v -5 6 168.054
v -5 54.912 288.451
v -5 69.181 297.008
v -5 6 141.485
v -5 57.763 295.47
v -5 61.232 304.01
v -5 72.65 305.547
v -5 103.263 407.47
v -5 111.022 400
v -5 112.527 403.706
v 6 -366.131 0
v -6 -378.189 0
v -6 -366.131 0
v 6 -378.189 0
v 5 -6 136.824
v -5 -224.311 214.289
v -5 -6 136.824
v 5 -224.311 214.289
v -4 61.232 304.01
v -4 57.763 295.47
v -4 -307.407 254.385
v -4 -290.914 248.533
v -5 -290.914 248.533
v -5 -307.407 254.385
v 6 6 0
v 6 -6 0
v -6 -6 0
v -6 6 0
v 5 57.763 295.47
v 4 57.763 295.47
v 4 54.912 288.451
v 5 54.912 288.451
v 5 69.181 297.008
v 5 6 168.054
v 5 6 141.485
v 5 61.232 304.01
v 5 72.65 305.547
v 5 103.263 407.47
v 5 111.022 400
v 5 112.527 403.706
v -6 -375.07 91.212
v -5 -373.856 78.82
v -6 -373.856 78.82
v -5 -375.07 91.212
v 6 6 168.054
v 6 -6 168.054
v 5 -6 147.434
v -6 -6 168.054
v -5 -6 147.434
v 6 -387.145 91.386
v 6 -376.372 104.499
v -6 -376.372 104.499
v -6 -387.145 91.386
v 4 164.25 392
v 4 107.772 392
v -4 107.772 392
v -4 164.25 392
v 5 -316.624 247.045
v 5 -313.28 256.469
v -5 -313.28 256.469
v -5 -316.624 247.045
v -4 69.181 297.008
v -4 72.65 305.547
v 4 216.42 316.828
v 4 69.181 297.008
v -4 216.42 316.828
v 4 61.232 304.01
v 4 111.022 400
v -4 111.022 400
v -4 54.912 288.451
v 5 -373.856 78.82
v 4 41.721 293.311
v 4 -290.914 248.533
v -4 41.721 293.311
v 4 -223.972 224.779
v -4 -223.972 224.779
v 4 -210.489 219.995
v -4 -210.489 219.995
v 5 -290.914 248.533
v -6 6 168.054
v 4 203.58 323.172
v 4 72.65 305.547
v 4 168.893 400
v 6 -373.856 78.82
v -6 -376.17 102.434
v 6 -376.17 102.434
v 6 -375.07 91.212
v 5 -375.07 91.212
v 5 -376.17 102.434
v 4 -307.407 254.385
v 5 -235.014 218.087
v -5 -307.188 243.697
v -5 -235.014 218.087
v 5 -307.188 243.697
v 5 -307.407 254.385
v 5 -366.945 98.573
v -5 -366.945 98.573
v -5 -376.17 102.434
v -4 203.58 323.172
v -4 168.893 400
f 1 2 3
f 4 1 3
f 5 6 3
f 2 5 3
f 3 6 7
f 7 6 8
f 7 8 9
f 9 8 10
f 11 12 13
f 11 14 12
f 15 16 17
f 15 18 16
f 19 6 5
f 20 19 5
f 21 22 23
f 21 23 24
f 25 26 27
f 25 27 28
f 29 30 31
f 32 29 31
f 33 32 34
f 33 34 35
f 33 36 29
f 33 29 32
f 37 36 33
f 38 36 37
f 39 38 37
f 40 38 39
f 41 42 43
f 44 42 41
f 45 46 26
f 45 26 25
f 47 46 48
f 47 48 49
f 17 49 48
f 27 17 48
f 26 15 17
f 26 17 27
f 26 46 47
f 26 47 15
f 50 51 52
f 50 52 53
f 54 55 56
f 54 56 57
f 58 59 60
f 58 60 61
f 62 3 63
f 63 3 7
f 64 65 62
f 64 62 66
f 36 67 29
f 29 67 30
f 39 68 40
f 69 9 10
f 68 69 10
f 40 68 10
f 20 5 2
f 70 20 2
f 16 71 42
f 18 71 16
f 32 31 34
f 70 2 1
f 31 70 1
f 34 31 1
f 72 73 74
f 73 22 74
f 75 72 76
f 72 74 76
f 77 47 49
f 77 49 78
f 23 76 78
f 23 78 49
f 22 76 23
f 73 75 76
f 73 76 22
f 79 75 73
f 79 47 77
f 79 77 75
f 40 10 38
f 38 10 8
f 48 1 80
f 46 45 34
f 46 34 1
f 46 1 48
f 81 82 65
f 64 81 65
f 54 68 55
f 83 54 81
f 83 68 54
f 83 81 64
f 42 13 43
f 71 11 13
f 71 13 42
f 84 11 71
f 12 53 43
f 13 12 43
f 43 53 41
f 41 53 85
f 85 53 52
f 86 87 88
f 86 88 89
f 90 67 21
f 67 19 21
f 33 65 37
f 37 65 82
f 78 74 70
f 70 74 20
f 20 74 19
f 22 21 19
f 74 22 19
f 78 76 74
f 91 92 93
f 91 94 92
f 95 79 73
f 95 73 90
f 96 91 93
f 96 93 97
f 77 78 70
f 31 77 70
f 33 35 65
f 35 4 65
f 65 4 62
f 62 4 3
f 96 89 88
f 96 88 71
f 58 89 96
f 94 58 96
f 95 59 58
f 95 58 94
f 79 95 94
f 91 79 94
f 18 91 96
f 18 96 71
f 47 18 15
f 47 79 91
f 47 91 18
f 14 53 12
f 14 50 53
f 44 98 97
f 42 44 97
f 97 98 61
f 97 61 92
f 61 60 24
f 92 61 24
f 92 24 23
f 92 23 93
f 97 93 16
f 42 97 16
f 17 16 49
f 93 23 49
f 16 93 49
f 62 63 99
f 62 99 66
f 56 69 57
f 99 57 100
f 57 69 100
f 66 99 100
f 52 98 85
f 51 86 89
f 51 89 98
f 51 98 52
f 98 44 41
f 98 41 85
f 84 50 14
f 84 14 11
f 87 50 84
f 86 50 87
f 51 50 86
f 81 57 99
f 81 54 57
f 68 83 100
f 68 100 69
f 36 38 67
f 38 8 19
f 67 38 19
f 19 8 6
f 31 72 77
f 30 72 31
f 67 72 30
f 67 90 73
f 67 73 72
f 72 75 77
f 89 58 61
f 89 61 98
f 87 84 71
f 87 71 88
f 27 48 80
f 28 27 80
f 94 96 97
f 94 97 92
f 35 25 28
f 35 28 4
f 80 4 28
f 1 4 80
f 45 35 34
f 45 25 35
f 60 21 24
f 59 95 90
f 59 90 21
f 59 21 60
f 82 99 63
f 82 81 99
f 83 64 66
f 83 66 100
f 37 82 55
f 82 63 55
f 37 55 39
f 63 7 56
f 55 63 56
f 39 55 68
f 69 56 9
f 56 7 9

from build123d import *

# Parameters (mm, degrees)
F2_DEPTH = 6
F3_DEPTH = 5
F4_DEPTH = 4


with BuildPart() as f2:
    # F1 (on Right) → F2 (new body, symmetric)
    with BuildSketch(Plane.YZ):
        Polygon((6, 168.0537815686), (-6, 168.0537815686), (-6, 147.4344787753), (-6, 136.8235857408), (-6, 0), (6, 0), (6, 141.4846799699), align=None)
    extrude(amount=F2_DEPTH, both=True)



with BuildPart() as f2b:
    # F1 (on Right) → F2, piece 2 (new body, symmetric)
    with BuildSketch(Plane.YZ):
        Polygon((-366.1312568474, 0), (-373.8555777285, 78.8196008275), (-375.0700772329, 91.2124529134), (-376.1697828669, 102.433938974), (-376.3721973614, 104.499393), (-387.1445919312, 91.3862120271), (-378.1887431526, 0), align=None)
    extrude(amount=F2_DEPTH, both=True)


with BuildPart() as f2_1:
    add(f2.part)

    add(f2b.part)  # F3 merges F2b
    # F1 (on Right) → F3 (join, symmetric)
    with BuildSketch(Plane.YZ):
        Polygon((54.9115302543, 288.4513945022), (6, 168.0537815686), (6, 141.4846799699), (69.1811610546, 297.0075379505), (72.6501883928, 305.5466821674), (107.7718487622, 392), (111.0218487622, 400), (112.5273569501, 403.7058663085), (103.2626911788, 407.469636778), (61.2320620859, 304.0096267031), (57.7630347477, 295.4704824861), align=None)
        Polygon((-6, 136.8235857408), (-6, 147.4344787753), (-210.4892851655, 219.9951928663), (-223.9719705091, 224.7793715366), (-290.9143972643, 248.5331358691), (-307.4065665233, 254.3851959287), (-313.2799449629, 256.4692979557), (-316.6240434146, 247.0450205009), (-307.1881482882, 243.6967996495), (-235.0141298479, 218.086664074), (-224.3114881972, 214.2889525205), align=None)
        Polygon((-373.8555777285, 78.8196008275), (-224.3114881972, 214.2889525205), (-235.0141298479, 218.086664074), (-366.9451312979, 98.5726980545), (-375.0700772329, 91.2124529134), align=None)
        Polygon((-366.9451312979, 98.5726980545), (-307.1881482882, 243.6967996495), (-316.6240434146, 247.0450205009), (-376.1697828669, 102.433938974), (-375.0700772329, 91.2124529134), align=None)
    extrude(amount=F3_DEPTH, both=True)

    # F1 (on Right) → F4 (join, symmetric)
    with BuildSketch(Plane.YZ):
        Polygon((41.7213857169, 293.3110297319), (57.7630347477, 295.4704824861), (61.2320620859, 304.0096267031), (-307.4065665233, 254.3851959287), (-290.9143972643, 248.5331358691), align=None)
        Polygon((-210.4892851655, 219.9951928663), (54.9115302543, 288.4513945022), (57.7630347477, 295.4704824861), (41.7213857169, 293.3110297319), (-223.9719705091, 224.7793715366), align=None)
        Polygon((72.6501883928, 305.5466821674), (69.1811610546, 297.0075379505), (216.4195260905, 316.8280870899), (203.5804739095, 323.1719129101), align=None)
        Polygon((203.5804739095, 323.1719129101), (216.4195260905, 316.8280870899), (168.8927187133, 400), (164.2501384295, 392), align=None)
        Polygon((164.2501384295, 392), (168.8927187133, 400), (111.0218487622, 400), (107.7718487622, 392), align=None)
    extrude(amount=F4_DEPTH, both=True)


solid = f2_1.part
